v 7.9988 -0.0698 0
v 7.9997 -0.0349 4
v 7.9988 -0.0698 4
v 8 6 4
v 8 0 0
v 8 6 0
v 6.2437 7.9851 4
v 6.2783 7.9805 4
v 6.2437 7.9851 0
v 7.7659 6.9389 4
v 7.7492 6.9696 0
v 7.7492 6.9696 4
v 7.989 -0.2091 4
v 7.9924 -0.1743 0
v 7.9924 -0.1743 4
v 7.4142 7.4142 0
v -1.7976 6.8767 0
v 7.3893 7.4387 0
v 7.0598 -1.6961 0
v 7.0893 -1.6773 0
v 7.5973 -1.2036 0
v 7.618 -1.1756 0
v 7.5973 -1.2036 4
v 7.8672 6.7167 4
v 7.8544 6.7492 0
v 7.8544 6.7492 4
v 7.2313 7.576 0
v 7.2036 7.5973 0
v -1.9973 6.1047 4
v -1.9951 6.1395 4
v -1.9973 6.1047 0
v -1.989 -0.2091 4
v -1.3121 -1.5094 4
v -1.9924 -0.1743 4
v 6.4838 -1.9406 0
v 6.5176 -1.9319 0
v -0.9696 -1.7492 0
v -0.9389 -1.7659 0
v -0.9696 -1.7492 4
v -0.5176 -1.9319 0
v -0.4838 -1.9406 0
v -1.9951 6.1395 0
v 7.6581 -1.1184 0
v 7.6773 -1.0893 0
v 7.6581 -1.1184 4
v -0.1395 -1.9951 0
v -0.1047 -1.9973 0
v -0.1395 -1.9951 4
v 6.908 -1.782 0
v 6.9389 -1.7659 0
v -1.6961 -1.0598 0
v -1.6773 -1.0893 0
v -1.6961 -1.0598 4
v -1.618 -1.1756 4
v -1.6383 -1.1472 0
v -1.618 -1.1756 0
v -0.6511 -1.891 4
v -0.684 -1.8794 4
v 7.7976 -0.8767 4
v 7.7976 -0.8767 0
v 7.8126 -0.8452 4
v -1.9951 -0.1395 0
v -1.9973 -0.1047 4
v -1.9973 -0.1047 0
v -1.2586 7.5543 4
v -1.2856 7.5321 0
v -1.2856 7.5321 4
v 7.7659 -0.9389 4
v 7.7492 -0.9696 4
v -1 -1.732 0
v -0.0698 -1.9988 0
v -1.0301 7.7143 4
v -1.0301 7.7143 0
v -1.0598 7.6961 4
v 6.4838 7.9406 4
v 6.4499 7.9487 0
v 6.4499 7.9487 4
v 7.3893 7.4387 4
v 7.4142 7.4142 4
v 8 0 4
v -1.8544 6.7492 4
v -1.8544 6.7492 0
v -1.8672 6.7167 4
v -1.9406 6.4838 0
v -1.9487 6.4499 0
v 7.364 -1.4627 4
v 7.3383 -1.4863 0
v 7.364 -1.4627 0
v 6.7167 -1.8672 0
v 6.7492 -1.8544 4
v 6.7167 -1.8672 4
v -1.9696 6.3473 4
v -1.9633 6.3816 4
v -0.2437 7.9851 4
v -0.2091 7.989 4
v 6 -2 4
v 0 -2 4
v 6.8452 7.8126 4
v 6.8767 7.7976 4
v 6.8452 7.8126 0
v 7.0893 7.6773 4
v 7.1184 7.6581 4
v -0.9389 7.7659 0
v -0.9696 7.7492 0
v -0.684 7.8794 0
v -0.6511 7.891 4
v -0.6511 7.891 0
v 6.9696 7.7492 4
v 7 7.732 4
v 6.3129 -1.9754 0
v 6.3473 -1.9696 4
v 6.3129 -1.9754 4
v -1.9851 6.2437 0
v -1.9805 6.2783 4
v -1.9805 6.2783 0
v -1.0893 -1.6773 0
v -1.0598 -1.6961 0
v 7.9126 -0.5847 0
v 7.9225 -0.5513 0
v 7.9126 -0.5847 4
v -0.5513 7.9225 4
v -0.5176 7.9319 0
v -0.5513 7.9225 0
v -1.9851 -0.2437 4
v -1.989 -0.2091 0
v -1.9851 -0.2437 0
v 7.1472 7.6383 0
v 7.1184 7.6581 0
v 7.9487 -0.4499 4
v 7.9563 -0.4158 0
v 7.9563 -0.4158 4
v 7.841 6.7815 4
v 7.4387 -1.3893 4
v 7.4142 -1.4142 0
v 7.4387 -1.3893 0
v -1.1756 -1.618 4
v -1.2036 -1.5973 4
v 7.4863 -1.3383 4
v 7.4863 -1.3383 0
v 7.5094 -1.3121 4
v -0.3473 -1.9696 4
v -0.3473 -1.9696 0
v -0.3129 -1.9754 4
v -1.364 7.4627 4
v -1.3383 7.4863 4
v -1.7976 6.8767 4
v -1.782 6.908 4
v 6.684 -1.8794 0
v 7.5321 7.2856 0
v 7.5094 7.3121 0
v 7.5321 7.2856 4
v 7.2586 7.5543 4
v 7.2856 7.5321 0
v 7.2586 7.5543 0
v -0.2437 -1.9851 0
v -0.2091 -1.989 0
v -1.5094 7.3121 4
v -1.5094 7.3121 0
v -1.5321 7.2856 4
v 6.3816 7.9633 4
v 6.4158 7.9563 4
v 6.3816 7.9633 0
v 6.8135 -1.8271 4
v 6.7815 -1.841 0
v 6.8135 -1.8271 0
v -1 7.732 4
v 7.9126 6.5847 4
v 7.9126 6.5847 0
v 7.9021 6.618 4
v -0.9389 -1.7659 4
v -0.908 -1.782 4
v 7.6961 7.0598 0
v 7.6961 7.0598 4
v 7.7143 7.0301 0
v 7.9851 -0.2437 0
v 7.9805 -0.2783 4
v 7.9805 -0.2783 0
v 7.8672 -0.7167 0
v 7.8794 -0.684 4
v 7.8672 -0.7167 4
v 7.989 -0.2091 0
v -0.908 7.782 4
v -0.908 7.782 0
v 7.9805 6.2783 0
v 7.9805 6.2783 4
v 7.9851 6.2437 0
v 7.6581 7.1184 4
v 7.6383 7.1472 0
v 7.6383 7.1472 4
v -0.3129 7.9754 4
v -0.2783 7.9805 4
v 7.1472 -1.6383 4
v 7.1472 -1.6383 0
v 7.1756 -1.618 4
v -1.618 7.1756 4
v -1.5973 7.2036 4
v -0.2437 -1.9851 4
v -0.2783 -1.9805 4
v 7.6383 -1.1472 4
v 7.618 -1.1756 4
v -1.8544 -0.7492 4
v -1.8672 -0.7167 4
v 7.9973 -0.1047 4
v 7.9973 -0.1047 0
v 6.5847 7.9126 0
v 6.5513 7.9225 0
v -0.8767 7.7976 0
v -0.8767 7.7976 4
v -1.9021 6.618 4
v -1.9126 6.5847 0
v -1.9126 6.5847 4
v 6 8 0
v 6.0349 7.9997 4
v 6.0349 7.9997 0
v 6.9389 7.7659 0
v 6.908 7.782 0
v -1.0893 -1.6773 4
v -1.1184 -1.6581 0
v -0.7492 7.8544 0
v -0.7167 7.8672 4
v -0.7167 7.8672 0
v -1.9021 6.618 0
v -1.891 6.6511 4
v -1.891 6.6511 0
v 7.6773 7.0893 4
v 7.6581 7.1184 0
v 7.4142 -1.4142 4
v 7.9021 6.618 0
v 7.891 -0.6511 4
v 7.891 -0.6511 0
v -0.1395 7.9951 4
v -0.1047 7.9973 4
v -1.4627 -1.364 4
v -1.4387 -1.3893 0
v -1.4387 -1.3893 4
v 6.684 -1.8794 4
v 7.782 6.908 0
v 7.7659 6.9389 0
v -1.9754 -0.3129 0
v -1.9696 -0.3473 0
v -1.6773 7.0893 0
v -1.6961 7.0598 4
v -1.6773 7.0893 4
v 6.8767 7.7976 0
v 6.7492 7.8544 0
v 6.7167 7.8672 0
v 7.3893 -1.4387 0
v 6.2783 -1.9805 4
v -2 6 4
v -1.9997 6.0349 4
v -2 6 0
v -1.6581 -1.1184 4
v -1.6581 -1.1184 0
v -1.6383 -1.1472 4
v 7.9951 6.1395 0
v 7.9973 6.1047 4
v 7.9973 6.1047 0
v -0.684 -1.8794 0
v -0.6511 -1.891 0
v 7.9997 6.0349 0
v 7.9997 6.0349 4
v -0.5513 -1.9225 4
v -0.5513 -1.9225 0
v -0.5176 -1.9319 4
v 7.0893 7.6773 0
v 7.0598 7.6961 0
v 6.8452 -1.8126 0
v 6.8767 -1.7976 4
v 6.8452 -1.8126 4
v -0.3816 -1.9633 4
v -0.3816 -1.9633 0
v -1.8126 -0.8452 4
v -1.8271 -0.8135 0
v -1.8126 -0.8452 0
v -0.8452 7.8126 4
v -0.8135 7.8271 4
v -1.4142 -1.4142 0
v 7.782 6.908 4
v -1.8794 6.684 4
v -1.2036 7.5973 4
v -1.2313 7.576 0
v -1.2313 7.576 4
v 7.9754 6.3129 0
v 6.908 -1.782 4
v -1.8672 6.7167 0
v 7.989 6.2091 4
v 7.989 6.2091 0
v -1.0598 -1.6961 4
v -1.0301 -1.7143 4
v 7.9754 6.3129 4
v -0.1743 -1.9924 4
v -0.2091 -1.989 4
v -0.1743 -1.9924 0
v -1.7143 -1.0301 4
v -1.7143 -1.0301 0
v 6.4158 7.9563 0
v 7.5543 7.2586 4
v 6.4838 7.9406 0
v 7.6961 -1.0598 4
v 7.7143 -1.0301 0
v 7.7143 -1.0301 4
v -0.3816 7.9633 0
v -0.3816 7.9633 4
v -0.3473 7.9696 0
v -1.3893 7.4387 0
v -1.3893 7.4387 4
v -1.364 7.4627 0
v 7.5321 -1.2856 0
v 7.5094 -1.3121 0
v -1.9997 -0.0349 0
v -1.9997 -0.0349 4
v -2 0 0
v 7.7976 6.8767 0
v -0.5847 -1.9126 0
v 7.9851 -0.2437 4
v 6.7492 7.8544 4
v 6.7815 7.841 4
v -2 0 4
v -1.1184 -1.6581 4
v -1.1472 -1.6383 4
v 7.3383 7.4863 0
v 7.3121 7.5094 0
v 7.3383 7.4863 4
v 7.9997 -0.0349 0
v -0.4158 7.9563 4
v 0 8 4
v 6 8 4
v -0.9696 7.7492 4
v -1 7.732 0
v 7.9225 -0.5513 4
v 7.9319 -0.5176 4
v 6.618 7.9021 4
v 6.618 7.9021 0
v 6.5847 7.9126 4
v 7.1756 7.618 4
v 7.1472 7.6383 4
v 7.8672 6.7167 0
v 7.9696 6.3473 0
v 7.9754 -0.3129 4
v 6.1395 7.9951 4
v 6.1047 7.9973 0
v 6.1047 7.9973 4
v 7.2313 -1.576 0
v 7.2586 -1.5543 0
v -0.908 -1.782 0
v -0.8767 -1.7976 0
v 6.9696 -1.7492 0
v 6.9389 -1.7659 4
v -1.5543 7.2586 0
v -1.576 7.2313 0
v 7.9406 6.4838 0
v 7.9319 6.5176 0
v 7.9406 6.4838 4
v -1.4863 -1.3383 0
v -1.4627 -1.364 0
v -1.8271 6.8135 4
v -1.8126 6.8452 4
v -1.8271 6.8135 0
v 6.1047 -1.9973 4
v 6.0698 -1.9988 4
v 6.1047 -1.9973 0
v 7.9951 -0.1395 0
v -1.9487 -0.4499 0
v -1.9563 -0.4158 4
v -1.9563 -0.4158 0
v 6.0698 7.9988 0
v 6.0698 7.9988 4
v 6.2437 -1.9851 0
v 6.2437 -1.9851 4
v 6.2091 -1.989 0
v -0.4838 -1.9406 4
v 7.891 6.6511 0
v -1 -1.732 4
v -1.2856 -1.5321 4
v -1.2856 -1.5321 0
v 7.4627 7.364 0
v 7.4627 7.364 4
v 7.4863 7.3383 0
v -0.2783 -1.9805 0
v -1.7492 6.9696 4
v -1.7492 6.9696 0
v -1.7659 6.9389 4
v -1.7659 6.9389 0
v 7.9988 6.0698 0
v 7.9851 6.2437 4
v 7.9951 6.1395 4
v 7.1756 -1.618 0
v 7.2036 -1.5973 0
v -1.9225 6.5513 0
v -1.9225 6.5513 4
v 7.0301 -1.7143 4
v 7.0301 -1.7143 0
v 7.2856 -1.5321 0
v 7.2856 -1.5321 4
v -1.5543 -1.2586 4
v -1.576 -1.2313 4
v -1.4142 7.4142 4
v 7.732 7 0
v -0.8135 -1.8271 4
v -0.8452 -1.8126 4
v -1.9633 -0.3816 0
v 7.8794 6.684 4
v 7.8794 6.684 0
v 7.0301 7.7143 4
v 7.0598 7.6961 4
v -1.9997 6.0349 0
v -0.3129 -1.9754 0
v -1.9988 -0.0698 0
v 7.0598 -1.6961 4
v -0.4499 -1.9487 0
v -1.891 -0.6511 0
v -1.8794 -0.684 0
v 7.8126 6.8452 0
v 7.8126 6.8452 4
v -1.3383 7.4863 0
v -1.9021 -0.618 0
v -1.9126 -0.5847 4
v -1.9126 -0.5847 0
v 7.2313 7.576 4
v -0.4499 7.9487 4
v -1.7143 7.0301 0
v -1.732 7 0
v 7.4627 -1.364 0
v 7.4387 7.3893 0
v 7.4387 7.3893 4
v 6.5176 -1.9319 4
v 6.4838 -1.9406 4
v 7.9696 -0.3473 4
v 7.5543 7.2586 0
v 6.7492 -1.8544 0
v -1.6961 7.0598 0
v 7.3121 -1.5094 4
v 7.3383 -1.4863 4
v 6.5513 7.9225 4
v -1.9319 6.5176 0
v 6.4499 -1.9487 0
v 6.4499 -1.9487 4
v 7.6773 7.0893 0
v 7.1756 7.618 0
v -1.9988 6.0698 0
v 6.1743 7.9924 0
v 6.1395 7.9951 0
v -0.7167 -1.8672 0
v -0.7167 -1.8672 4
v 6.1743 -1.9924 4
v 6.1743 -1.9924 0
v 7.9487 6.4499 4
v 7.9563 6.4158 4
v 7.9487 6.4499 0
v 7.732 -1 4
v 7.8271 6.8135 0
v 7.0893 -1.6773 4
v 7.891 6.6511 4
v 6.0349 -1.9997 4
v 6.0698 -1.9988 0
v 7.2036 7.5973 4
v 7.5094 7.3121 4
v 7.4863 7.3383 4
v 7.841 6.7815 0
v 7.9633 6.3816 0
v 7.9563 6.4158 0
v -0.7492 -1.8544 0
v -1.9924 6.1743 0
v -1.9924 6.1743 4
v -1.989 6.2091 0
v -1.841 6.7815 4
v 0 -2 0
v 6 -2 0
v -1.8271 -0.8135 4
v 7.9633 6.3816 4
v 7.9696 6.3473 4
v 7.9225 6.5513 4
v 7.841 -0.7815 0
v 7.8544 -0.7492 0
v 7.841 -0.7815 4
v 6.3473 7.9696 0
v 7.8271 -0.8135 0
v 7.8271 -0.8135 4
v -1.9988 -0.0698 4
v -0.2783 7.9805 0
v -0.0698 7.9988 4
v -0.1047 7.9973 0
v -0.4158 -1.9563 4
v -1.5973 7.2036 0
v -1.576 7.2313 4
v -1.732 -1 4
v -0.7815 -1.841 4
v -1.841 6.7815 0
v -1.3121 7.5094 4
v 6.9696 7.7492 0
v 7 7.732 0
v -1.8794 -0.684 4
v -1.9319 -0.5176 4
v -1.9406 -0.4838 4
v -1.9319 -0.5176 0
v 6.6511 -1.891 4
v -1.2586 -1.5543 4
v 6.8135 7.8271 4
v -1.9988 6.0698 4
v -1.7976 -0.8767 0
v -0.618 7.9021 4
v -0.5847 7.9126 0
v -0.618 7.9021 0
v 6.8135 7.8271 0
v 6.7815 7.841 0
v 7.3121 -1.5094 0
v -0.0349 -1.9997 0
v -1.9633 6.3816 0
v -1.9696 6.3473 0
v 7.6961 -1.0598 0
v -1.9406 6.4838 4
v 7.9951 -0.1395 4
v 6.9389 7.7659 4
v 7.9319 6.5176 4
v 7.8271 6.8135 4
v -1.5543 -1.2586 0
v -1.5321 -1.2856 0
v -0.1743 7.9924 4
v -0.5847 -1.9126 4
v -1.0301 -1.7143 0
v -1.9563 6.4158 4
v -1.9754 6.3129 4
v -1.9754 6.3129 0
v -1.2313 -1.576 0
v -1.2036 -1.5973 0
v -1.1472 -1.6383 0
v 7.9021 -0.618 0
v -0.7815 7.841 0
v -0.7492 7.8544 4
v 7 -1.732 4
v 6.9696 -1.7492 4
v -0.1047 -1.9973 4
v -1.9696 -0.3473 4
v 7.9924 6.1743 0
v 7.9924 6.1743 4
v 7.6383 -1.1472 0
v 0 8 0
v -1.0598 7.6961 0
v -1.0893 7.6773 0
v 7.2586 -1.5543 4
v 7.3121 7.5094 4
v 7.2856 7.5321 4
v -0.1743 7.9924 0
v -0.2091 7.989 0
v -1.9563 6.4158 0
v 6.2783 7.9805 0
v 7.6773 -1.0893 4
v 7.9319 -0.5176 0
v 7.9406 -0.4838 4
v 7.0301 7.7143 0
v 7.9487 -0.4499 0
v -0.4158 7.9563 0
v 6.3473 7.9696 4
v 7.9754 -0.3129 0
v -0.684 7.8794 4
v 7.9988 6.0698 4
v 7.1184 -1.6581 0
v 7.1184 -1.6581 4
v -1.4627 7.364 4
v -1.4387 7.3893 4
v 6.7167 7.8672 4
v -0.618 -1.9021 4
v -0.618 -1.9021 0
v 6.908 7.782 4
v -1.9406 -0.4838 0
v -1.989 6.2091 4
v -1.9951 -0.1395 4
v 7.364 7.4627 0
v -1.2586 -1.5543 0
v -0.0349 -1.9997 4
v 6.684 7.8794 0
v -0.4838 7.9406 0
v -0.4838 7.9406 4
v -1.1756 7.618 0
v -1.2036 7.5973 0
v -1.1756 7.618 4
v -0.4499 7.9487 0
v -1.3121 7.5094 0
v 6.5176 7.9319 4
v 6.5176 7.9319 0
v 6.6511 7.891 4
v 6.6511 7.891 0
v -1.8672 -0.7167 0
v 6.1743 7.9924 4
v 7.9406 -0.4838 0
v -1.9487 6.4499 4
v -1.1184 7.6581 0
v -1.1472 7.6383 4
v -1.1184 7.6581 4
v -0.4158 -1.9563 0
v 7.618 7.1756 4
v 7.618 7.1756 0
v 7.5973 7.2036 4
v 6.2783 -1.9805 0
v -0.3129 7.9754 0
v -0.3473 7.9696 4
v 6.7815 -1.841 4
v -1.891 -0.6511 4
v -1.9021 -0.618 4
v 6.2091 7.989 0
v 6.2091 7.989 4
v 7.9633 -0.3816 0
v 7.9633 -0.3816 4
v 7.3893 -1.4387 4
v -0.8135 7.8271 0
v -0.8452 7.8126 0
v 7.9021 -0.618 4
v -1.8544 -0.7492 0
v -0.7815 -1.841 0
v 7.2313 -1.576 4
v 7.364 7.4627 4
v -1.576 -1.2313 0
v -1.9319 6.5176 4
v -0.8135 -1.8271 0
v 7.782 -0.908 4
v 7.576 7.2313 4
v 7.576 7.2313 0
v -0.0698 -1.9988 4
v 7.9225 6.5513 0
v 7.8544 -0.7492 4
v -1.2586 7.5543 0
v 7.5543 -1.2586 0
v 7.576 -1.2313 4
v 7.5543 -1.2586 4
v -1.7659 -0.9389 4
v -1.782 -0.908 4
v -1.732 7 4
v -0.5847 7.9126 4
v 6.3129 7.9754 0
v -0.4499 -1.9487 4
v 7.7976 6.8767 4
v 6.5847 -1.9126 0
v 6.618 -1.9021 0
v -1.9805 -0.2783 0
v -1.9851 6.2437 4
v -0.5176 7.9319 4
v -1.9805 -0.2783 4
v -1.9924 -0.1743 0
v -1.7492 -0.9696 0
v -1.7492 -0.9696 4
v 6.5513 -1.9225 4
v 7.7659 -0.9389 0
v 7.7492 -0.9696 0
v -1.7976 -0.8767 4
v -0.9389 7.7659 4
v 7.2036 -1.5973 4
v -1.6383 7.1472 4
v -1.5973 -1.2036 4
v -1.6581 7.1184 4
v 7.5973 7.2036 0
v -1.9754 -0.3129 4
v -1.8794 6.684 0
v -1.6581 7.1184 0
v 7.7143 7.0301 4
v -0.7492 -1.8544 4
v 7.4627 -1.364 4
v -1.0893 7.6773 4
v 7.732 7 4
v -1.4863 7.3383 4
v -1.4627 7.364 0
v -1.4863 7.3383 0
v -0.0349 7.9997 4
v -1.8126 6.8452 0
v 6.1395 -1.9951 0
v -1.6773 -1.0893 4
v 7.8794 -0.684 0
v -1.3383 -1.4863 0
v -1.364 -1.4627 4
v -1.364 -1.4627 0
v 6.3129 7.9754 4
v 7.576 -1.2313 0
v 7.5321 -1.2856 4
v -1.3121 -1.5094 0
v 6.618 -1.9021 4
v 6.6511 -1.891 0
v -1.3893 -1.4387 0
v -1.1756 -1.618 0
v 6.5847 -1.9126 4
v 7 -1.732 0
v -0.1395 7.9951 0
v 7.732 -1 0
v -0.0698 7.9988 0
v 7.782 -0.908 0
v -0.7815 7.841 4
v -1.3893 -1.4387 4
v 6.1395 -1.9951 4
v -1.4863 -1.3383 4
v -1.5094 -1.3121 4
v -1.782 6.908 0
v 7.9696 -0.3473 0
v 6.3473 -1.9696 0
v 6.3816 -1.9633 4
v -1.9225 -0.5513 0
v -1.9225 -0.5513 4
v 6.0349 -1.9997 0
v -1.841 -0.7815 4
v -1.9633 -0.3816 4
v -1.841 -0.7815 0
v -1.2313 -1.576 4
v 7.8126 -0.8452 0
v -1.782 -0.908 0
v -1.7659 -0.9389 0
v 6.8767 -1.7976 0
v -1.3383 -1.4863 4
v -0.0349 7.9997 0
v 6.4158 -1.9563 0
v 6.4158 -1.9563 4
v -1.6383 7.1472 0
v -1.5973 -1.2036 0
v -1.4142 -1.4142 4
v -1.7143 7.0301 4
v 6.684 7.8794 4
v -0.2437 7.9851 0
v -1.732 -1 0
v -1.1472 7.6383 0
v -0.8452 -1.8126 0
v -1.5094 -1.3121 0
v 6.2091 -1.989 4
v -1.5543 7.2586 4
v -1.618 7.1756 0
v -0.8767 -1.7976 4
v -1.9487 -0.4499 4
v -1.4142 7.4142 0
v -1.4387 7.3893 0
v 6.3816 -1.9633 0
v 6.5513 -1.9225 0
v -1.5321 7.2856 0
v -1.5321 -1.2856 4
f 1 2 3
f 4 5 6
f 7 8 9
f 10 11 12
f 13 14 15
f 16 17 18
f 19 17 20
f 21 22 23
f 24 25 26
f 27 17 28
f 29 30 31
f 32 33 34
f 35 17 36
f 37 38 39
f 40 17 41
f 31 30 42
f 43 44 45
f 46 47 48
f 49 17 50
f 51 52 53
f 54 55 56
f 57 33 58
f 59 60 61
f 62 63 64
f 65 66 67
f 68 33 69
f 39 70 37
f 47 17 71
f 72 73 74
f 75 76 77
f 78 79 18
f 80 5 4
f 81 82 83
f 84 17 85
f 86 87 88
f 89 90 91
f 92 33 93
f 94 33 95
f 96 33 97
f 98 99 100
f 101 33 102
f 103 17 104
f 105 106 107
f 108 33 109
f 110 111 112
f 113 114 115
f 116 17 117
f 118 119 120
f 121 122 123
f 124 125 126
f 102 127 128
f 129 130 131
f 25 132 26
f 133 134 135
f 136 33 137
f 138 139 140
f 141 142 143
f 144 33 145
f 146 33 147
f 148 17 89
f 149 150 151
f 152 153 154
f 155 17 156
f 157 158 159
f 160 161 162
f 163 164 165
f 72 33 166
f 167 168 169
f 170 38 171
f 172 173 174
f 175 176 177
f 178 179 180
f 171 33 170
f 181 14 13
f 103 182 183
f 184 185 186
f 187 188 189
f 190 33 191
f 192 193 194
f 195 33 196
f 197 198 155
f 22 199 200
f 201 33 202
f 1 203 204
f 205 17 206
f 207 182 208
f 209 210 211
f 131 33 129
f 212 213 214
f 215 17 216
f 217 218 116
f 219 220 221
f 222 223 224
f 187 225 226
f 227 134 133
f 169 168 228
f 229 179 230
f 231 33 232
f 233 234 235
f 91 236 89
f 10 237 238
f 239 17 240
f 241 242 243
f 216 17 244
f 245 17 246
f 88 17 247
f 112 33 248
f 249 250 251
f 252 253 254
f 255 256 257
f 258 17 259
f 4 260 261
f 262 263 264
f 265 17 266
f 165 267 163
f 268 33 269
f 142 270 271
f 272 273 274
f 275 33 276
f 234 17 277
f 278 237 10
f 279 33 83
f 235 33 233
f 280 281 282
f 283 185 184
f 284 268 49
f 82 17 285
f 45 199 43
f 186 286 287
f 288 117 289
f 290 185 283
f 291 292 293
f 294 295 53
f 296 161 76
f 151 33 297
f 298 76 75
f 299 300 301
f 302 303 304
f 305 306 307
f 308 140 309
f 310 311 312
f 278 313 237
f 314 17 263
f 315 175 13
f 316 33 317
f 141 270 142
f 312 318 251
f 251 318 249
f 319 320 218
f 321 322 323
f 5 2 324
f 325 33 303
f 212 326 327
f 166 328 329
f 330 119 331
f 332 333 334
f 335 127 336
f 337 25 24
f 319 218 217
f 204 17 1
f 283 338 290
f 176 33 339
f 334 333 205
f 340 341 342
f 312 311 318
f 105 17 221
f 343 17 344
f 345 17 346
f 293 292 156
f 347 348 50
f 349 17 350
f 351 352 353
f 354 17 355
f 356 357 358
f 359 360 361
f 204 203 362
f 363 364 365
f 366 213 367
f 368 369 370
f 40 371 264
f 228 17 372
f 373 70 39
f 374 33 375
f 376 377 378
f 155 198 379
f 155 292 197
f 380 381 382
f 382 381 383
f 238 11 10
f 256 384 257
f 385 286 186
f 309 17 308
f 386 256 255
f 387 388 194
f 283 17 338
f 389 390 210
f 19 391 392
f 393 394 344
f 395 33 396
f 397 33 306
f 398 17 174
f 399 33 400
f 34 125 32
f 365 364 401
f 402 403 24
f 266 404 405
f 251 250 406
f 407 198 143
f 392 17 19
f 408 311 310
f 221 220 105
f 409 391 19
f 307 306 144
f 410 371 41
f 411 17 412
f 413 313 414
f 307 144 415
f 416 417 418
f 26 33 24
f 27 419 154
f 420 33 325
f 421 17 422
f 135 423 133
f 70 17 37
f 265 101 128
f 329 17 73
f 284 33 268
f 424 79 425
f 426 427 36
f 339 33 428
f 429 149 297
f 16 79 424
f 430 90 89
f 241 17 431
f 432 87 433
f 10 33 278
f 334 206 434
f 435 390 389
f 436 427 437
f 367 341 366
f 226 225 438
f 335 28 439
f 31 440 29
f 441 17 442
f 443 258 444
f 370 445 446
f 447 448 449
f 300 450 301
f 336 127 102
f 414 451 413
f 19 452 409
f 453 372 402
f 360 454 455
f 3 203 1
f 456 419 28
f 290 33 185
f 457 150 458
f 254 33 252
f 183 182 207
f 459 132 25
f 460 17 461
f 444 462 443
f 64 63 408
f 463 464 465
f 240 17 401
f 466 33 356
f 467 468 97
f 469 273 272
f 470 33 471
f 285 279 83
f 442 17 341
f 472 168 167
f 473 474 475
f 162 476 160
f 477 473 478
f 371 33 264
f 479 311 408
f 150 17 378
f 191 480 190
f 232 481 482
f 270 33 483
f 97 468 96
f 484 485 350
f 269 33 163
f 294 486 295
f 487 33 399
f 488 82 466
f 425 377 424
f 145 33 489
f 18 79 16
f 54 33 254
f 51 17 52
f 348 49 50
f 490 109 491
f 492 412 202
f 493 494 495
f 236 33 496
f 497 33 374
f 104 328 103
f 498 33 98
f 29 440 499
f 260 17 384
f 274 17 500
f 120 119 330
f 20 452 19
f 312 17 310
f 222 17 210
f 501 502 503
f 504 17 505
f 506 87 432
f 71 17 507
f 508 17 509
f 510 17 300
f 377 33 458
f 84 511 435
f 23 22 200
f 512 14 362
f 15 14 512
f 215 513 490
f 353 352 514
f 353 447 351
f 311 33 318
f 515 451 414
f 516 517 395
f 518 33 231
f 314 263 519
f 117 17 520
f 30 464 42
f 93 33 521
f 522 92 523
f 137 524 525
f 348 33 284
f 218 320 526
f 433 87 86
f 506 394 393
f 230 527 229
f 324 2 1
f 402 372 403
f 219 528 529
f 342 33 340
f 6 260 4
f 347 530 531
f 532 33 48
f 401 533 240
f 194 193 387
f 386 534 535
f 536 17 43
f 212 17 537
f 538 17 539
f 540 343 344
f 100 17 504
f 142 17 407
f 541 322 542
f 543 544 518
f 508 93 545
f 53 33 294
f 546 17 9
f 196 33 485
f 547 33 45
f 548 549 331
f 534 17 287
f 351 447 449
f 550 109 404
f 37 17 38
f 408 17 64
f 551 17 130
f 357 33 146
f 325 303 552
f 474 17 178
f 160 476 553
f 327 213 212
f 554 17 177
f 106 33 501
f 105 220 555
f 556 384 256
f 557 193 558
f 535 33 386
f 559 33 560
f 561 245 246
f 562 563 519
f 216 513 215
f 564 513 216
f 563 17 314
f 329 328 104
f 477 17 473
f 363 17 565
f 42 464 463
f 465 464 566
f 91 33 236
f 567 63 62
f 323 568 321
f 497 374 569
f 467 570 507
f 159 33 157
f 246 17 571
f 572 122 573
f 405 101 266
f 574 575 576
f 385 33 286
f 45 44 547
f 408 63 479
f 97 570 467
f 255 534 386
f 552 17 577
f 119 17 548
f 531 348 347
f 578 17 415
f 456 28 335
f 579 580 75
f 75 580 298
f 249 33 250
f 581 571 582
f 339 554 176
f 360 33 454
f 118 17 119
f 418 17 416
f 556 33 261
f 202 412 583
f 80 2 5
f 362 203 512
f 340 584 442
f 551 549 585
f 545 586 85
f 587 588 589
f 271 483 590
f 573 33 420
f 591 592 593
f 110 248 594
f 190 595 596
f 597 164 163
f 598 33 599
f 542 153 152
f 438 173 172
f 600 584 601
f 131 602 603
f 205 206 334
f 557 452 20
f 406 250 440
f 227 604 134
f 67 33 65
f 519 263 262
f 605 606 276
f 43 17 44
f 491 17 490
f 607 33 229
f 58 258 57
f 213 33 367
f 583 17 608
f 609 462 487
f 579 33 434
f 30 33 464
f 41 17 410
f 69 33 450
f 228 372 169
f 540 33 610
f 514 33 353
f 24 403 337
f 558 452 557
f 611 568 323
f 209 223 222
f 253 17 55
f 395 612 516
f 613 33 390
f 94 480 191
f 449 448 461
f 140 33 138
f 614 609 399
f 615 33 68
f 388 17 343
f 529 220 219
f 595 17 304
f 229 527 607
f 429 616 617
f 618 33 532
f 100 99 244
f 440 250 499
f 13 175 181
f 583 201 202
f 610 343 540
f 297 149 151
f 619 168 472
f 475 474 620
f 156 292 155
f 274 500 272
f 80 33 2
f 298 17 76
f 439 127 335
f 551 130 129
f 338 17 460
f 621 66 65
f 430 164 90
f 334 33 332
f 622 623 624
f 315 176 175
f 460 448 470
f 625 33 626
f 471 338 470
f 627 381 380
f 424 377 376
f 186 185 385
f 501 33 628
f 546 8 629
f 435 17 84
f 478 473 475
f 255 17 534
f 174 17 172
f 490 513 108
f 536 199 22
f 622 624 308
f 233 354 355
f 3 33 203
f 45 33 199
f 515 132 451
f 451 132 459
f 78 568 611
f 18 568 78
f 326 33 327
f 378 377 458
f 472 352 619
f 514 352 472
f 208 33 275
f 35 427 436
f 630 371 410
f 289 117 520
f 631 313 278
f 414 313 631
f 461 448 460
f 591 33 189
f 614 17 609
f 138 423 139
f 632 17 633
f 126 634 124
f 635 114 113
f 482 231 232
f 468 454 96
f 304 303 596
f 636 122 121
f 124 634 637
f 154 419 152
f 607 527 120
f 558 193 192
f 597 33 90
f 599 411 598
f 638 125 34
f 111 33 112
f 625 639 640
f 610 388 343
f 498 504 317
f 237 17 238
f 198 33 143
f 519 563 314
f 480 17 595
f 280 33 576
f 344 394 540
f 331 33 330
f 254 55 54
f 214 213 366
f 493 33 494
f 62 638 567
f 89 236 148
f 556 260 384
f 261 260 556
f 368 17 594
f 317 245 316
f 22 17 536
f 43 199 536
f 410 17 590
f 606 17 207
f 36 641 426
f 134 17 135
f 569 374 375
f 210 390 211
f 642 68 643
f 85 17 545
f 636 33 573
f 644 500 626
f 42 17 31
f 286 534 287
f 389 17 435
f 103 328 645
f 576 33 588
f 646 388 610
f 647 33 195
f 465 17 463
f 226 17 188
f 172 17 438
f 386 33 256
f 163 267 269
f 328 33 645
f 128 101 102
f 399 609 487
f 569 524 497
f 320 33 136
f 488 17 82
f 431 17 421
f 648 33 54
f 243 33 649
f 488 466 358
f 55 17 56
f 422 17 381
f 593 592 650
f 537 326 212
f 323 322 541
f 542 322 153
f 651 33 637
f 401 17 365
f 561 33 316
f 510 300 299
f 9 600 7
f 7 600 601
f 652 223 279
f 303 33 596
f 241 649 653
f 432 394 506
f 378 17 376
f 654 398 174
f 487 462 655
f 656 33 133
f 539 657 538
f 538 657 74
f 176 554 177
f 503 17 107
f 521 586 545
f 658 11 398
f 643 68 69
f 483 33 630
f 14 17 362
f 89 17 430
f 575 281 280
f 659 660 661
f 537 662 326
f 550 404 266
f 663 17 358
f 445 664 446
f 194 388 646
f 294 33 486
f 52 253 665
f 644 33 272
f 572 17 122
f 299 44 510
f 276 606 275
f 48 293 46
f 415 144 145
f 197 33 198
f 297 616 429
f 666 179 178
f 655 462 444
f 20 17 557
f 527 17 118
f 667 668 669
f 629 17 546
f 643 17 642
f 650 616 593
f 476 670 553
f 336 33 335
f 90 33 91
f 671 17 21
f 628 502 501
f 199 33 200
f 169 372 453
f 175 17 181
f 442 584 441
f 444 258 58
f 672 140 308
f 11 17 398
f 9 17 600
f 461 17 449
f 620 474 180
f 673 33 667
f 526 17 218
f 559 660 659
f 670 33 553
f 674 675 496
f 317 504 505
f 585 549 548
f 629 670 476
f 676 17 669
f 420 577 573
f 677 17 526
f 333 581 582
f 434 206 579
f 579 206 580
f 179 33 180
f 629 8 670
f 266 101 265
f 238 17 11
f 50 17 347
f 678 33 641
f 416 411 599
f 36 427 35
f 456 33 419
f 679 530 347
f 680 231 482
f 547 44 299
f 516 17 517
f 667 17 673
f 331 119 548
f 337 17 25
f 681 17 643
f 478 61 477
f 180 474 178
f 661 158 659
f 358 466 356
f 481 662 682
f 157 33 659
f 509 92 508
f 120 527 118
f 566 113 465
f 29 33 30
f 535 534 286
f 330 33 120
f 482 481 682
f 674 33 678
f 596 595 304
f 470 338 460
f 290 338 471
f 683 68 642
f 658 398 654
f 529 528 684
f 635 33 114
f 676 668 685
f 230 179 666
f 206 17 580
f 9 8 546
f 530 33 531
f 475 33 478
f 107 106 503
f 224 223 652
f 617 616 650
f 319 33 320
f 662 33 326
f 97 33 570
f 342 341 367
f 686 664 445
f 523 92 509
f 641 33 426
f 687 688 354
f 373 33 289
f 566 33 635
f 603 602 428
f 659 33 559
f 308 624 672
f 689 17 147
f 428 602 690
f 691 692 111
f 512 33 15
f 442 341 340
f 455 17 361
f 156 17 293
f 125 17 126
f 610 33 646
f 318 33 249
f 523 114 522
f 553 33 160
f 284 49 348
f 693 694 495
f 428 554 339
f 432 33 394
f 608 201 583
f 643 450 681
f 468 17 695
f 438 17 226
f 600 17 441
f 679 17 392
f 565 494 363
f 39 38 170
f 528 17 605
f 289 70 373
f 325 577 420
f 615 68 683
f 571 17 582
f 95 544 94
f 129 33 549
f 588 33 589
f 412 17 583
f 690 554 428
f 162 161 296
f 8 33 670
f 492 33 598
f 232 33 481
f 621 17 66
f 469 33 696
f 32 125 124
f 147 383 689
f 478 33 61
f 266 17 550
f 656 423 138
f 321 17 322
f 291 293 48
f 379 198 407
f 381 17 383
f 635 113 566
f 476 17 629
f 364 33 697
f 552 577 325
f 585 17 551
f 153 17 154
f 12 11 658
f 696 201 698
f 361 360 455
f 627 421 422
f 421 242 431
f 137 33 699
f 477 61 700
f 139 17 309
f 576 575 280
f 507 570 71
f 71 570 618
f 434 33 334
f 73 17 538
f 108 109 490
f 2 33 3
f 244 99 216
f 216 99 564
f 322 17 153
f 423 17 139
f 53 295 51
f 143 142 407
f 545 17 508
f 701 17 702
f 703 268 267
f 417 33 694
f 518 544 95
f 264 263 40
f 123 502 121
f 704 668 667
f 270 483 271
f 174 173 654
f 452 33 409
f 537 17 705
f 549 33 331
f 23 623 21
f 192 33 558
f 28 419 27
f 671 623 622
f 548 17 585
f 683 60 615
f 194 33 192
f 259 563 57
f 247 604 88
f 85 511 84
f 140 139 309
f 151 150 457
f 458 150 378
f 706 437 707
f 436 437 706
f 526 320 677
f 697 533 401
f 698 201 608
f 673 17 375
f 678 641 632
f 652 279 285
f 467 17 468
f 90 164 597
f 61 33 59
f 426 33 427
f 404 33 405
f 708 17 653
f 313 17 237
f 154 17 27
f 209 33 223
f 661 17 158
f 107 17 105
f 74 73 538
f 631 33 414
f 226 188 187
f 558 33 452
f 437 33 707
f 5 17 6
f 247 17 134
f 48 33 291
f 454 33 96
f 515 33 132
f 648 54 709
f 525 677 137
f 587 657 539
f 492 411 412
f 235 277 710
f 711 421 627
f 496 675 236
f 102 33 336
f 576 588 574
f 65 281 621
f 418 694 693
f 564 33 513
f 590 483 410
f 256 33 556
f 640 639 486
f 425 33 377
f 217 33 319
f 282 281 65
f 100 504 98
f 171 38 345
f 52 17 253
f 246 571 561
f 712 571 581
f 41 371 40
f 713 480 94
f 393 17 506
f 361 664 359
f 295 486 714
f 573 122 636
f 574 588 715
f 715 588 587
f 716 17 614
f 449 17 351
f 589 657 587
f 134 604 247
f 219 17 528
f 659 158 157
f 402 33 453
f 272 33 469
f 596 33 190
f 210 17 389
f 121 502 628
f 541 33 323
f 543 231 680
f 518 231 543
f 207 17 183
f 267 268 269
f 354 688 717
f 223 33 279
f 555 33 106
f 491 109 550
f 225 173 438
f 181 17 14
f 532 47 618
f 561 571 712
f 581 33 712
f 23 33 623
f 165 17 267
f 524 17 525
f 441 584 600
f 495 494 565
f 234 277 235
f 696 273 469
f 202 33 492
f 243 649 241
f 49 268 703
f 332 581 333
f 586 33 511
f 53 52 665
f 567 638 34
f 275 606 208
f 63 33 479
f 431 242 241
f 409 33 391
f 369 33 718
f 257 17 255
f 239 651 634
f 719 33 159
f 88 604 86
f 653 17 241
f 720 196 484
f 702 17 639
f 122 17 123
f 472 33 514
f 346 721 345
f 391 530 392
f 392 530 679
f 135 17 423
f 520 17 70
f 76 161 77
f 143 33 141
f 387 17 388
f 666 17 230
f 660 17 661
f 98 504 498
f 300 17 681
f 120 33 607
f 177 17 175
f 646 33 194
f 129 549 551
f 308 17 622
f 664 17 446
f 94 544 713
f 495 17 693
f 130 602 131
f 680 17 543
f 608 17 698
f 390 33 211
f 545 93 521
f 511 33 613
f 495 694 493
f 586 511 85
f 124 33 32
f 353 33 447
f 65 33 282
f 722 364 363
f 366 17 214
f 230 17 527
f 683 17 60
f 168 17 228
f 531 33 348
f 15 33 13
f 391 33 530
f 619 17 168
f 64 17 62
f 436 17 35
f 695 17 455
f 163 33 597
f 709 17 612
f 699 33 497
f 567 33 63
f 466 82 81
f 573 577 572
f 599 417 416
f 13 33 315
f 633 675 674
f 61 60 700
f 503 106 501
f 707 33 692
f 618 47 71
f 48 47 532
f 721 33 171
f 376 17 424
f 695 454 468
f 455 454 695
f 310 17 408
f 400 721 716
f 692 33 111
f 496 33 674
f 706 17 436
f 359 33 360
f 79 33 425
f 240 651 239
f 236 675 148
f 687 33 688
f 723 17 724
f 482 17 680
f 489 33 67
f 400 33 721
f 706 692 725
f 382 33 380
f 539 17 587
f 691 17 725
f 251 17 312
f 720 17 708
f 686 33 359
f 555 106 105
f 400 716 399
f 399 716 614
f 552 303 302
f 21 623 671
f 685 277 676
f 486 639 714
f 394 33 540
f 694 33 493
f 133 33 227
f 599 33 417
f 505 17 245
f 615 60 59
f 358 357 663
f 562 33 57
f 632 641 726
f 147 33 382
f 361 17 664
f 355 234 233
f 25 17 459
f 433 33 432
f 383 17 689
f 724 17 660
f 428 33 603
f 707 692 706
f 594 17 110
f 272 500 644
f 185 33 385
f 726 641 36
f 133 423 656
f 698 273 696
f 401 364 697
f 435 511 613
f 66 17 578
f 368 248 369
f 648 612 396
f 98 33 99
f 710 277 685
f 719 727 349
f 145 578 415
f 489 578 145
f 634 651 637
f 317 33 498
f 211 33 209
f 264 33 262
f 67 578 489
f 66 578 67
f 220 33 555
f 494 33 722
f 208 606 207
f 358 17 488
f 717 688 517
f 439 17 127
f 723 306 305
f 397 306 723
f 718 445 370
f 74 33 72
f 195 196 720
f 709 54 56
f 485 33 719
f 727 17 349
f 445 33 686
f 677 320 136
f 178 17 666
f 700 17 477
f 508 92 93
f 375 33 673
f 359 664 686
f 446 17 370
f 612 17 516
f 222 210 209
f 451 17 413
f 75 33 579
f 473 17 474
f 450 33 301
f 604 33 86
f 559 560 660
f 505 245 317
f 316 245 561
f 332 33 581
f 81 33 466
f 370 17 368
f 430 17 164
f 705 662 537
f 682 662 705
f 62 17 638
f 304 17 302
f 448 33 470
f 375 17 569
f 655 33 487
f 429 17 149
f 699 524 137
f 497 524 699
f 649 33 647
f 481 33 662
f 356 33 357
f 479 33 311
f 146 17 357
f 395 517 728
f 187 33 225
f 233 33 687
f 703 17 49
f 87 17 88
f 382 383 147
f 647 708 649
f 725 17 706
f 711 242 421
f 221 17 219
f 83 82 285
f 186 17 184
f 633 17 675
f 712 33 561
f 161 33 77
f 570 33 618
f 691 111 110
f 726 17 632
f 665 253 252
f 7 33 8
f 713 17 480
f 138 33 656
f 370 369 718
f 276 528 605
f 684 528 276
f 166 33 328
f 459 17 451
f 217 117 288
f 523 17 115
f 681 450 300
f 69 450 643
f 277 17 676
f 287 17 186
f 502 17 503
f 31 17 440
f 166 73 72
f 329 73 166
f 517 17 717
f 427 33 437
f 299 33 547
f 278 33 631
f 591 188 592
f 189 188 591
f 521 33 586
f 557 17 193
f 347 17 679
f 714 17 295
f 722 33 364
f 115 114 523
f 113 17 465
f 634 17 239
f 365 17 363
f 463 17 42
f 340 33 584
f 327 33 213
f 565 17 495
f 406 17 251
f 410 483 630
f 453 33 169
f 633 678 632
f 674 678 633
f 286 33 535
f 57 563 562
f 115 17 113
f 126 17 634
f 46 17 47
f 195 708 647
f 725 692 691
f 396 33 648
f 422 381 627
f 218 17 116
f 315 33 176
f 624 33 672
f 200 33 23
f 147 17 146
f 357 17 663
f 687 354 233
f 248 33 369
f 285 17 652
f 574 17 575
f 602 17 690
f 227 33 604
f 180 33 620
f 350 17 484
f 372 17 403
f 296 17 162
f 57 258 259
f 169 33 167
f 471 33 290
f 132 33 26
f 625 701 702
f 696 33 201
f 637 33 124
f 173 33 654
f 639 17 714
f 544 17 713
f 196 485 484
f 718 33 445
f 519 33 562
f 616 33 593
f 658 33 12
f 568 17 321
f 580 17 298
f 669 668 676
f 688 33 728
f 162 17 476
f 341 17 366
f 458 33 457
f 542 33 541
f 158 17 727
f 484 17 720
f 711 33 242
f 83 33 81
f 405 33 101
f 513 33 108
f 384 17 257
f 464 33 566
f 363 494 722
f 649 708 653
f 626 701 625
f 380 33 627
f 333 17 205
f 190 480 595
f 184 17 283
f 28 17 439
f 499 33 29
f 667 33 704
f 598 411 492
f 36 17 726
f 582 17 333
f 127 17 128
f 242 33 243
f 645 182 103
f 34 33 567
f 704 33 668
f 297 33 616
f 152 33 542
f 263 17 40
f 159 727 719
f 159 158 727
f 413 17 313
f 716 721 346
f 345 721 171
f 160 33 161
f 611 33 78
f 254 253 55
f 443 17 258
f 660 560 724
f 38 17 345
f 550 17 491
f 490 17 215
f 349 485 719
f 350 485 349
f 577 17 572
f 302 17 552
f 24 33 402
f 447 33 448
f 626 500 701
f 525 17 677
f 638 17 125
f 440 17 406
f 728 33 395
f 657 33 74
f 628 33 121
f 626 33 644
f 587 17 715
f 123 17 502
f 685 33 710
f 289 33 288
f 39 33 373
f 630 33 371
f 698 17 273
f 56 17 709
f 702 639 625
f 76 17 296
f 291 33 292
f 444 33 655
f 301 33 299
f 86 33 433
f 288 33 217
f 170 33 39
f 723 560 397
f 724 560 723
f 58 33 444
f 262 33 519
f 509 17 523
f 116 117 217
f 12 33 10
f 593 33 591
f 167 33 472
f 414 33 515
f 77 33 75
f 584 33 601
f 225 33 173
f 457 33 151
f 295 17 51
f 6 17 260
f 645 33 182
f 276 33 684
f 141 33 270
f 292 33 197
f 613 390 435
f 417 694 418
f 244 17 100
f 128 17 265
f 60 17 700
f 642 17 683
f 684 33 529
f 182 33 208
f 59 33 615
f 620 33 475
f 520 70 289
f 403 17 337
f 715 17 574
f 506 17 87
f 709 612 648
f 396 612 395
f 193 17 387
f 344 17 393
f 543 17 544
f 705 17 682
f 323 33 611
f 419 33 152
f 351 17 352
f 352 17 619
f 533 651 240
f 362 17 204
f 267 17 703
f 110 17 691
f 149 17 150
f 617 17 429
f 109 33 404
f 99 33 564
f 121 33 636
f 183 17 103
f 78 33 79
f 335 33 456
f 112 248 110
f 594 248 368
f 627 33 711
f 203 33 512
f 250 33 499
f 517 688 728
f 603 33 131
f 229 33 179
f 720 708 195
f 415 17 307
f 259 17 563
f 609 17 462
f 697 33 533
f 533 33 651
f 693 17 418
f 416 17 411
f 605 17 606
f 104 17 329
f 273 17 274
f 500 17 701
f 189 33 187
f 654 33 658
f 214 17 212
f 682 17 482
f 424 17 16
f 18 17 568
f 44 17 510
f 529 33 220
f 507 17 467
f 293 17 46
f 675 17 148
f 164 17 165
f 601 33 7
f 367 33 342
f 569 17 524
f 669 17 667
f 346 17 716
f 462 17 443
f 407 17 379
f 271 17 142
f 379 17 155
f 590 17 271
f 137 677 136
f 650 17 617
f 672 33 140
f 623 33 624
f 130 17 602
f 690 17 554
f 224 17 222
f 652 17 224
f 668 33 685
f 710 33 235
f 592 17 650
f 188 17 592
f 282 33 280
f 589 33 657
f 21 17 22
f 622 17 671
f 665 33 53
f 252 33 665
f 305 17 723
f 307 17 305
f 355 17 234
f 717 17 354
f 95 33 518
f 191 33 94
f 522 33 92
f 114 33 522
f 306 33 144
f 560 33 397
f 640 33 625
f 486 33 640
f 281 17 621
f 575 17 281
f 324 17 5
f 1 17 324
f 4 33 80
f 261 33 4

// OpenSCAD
Width = 10;
Depth = 10;
Height = 2;
Radius = 2;

$fn=360;
minkowski()
{
cube([Width-2*Radius,Depth-2*Radius,Height]);
cylinder(Height,Radius,Radius);
}
